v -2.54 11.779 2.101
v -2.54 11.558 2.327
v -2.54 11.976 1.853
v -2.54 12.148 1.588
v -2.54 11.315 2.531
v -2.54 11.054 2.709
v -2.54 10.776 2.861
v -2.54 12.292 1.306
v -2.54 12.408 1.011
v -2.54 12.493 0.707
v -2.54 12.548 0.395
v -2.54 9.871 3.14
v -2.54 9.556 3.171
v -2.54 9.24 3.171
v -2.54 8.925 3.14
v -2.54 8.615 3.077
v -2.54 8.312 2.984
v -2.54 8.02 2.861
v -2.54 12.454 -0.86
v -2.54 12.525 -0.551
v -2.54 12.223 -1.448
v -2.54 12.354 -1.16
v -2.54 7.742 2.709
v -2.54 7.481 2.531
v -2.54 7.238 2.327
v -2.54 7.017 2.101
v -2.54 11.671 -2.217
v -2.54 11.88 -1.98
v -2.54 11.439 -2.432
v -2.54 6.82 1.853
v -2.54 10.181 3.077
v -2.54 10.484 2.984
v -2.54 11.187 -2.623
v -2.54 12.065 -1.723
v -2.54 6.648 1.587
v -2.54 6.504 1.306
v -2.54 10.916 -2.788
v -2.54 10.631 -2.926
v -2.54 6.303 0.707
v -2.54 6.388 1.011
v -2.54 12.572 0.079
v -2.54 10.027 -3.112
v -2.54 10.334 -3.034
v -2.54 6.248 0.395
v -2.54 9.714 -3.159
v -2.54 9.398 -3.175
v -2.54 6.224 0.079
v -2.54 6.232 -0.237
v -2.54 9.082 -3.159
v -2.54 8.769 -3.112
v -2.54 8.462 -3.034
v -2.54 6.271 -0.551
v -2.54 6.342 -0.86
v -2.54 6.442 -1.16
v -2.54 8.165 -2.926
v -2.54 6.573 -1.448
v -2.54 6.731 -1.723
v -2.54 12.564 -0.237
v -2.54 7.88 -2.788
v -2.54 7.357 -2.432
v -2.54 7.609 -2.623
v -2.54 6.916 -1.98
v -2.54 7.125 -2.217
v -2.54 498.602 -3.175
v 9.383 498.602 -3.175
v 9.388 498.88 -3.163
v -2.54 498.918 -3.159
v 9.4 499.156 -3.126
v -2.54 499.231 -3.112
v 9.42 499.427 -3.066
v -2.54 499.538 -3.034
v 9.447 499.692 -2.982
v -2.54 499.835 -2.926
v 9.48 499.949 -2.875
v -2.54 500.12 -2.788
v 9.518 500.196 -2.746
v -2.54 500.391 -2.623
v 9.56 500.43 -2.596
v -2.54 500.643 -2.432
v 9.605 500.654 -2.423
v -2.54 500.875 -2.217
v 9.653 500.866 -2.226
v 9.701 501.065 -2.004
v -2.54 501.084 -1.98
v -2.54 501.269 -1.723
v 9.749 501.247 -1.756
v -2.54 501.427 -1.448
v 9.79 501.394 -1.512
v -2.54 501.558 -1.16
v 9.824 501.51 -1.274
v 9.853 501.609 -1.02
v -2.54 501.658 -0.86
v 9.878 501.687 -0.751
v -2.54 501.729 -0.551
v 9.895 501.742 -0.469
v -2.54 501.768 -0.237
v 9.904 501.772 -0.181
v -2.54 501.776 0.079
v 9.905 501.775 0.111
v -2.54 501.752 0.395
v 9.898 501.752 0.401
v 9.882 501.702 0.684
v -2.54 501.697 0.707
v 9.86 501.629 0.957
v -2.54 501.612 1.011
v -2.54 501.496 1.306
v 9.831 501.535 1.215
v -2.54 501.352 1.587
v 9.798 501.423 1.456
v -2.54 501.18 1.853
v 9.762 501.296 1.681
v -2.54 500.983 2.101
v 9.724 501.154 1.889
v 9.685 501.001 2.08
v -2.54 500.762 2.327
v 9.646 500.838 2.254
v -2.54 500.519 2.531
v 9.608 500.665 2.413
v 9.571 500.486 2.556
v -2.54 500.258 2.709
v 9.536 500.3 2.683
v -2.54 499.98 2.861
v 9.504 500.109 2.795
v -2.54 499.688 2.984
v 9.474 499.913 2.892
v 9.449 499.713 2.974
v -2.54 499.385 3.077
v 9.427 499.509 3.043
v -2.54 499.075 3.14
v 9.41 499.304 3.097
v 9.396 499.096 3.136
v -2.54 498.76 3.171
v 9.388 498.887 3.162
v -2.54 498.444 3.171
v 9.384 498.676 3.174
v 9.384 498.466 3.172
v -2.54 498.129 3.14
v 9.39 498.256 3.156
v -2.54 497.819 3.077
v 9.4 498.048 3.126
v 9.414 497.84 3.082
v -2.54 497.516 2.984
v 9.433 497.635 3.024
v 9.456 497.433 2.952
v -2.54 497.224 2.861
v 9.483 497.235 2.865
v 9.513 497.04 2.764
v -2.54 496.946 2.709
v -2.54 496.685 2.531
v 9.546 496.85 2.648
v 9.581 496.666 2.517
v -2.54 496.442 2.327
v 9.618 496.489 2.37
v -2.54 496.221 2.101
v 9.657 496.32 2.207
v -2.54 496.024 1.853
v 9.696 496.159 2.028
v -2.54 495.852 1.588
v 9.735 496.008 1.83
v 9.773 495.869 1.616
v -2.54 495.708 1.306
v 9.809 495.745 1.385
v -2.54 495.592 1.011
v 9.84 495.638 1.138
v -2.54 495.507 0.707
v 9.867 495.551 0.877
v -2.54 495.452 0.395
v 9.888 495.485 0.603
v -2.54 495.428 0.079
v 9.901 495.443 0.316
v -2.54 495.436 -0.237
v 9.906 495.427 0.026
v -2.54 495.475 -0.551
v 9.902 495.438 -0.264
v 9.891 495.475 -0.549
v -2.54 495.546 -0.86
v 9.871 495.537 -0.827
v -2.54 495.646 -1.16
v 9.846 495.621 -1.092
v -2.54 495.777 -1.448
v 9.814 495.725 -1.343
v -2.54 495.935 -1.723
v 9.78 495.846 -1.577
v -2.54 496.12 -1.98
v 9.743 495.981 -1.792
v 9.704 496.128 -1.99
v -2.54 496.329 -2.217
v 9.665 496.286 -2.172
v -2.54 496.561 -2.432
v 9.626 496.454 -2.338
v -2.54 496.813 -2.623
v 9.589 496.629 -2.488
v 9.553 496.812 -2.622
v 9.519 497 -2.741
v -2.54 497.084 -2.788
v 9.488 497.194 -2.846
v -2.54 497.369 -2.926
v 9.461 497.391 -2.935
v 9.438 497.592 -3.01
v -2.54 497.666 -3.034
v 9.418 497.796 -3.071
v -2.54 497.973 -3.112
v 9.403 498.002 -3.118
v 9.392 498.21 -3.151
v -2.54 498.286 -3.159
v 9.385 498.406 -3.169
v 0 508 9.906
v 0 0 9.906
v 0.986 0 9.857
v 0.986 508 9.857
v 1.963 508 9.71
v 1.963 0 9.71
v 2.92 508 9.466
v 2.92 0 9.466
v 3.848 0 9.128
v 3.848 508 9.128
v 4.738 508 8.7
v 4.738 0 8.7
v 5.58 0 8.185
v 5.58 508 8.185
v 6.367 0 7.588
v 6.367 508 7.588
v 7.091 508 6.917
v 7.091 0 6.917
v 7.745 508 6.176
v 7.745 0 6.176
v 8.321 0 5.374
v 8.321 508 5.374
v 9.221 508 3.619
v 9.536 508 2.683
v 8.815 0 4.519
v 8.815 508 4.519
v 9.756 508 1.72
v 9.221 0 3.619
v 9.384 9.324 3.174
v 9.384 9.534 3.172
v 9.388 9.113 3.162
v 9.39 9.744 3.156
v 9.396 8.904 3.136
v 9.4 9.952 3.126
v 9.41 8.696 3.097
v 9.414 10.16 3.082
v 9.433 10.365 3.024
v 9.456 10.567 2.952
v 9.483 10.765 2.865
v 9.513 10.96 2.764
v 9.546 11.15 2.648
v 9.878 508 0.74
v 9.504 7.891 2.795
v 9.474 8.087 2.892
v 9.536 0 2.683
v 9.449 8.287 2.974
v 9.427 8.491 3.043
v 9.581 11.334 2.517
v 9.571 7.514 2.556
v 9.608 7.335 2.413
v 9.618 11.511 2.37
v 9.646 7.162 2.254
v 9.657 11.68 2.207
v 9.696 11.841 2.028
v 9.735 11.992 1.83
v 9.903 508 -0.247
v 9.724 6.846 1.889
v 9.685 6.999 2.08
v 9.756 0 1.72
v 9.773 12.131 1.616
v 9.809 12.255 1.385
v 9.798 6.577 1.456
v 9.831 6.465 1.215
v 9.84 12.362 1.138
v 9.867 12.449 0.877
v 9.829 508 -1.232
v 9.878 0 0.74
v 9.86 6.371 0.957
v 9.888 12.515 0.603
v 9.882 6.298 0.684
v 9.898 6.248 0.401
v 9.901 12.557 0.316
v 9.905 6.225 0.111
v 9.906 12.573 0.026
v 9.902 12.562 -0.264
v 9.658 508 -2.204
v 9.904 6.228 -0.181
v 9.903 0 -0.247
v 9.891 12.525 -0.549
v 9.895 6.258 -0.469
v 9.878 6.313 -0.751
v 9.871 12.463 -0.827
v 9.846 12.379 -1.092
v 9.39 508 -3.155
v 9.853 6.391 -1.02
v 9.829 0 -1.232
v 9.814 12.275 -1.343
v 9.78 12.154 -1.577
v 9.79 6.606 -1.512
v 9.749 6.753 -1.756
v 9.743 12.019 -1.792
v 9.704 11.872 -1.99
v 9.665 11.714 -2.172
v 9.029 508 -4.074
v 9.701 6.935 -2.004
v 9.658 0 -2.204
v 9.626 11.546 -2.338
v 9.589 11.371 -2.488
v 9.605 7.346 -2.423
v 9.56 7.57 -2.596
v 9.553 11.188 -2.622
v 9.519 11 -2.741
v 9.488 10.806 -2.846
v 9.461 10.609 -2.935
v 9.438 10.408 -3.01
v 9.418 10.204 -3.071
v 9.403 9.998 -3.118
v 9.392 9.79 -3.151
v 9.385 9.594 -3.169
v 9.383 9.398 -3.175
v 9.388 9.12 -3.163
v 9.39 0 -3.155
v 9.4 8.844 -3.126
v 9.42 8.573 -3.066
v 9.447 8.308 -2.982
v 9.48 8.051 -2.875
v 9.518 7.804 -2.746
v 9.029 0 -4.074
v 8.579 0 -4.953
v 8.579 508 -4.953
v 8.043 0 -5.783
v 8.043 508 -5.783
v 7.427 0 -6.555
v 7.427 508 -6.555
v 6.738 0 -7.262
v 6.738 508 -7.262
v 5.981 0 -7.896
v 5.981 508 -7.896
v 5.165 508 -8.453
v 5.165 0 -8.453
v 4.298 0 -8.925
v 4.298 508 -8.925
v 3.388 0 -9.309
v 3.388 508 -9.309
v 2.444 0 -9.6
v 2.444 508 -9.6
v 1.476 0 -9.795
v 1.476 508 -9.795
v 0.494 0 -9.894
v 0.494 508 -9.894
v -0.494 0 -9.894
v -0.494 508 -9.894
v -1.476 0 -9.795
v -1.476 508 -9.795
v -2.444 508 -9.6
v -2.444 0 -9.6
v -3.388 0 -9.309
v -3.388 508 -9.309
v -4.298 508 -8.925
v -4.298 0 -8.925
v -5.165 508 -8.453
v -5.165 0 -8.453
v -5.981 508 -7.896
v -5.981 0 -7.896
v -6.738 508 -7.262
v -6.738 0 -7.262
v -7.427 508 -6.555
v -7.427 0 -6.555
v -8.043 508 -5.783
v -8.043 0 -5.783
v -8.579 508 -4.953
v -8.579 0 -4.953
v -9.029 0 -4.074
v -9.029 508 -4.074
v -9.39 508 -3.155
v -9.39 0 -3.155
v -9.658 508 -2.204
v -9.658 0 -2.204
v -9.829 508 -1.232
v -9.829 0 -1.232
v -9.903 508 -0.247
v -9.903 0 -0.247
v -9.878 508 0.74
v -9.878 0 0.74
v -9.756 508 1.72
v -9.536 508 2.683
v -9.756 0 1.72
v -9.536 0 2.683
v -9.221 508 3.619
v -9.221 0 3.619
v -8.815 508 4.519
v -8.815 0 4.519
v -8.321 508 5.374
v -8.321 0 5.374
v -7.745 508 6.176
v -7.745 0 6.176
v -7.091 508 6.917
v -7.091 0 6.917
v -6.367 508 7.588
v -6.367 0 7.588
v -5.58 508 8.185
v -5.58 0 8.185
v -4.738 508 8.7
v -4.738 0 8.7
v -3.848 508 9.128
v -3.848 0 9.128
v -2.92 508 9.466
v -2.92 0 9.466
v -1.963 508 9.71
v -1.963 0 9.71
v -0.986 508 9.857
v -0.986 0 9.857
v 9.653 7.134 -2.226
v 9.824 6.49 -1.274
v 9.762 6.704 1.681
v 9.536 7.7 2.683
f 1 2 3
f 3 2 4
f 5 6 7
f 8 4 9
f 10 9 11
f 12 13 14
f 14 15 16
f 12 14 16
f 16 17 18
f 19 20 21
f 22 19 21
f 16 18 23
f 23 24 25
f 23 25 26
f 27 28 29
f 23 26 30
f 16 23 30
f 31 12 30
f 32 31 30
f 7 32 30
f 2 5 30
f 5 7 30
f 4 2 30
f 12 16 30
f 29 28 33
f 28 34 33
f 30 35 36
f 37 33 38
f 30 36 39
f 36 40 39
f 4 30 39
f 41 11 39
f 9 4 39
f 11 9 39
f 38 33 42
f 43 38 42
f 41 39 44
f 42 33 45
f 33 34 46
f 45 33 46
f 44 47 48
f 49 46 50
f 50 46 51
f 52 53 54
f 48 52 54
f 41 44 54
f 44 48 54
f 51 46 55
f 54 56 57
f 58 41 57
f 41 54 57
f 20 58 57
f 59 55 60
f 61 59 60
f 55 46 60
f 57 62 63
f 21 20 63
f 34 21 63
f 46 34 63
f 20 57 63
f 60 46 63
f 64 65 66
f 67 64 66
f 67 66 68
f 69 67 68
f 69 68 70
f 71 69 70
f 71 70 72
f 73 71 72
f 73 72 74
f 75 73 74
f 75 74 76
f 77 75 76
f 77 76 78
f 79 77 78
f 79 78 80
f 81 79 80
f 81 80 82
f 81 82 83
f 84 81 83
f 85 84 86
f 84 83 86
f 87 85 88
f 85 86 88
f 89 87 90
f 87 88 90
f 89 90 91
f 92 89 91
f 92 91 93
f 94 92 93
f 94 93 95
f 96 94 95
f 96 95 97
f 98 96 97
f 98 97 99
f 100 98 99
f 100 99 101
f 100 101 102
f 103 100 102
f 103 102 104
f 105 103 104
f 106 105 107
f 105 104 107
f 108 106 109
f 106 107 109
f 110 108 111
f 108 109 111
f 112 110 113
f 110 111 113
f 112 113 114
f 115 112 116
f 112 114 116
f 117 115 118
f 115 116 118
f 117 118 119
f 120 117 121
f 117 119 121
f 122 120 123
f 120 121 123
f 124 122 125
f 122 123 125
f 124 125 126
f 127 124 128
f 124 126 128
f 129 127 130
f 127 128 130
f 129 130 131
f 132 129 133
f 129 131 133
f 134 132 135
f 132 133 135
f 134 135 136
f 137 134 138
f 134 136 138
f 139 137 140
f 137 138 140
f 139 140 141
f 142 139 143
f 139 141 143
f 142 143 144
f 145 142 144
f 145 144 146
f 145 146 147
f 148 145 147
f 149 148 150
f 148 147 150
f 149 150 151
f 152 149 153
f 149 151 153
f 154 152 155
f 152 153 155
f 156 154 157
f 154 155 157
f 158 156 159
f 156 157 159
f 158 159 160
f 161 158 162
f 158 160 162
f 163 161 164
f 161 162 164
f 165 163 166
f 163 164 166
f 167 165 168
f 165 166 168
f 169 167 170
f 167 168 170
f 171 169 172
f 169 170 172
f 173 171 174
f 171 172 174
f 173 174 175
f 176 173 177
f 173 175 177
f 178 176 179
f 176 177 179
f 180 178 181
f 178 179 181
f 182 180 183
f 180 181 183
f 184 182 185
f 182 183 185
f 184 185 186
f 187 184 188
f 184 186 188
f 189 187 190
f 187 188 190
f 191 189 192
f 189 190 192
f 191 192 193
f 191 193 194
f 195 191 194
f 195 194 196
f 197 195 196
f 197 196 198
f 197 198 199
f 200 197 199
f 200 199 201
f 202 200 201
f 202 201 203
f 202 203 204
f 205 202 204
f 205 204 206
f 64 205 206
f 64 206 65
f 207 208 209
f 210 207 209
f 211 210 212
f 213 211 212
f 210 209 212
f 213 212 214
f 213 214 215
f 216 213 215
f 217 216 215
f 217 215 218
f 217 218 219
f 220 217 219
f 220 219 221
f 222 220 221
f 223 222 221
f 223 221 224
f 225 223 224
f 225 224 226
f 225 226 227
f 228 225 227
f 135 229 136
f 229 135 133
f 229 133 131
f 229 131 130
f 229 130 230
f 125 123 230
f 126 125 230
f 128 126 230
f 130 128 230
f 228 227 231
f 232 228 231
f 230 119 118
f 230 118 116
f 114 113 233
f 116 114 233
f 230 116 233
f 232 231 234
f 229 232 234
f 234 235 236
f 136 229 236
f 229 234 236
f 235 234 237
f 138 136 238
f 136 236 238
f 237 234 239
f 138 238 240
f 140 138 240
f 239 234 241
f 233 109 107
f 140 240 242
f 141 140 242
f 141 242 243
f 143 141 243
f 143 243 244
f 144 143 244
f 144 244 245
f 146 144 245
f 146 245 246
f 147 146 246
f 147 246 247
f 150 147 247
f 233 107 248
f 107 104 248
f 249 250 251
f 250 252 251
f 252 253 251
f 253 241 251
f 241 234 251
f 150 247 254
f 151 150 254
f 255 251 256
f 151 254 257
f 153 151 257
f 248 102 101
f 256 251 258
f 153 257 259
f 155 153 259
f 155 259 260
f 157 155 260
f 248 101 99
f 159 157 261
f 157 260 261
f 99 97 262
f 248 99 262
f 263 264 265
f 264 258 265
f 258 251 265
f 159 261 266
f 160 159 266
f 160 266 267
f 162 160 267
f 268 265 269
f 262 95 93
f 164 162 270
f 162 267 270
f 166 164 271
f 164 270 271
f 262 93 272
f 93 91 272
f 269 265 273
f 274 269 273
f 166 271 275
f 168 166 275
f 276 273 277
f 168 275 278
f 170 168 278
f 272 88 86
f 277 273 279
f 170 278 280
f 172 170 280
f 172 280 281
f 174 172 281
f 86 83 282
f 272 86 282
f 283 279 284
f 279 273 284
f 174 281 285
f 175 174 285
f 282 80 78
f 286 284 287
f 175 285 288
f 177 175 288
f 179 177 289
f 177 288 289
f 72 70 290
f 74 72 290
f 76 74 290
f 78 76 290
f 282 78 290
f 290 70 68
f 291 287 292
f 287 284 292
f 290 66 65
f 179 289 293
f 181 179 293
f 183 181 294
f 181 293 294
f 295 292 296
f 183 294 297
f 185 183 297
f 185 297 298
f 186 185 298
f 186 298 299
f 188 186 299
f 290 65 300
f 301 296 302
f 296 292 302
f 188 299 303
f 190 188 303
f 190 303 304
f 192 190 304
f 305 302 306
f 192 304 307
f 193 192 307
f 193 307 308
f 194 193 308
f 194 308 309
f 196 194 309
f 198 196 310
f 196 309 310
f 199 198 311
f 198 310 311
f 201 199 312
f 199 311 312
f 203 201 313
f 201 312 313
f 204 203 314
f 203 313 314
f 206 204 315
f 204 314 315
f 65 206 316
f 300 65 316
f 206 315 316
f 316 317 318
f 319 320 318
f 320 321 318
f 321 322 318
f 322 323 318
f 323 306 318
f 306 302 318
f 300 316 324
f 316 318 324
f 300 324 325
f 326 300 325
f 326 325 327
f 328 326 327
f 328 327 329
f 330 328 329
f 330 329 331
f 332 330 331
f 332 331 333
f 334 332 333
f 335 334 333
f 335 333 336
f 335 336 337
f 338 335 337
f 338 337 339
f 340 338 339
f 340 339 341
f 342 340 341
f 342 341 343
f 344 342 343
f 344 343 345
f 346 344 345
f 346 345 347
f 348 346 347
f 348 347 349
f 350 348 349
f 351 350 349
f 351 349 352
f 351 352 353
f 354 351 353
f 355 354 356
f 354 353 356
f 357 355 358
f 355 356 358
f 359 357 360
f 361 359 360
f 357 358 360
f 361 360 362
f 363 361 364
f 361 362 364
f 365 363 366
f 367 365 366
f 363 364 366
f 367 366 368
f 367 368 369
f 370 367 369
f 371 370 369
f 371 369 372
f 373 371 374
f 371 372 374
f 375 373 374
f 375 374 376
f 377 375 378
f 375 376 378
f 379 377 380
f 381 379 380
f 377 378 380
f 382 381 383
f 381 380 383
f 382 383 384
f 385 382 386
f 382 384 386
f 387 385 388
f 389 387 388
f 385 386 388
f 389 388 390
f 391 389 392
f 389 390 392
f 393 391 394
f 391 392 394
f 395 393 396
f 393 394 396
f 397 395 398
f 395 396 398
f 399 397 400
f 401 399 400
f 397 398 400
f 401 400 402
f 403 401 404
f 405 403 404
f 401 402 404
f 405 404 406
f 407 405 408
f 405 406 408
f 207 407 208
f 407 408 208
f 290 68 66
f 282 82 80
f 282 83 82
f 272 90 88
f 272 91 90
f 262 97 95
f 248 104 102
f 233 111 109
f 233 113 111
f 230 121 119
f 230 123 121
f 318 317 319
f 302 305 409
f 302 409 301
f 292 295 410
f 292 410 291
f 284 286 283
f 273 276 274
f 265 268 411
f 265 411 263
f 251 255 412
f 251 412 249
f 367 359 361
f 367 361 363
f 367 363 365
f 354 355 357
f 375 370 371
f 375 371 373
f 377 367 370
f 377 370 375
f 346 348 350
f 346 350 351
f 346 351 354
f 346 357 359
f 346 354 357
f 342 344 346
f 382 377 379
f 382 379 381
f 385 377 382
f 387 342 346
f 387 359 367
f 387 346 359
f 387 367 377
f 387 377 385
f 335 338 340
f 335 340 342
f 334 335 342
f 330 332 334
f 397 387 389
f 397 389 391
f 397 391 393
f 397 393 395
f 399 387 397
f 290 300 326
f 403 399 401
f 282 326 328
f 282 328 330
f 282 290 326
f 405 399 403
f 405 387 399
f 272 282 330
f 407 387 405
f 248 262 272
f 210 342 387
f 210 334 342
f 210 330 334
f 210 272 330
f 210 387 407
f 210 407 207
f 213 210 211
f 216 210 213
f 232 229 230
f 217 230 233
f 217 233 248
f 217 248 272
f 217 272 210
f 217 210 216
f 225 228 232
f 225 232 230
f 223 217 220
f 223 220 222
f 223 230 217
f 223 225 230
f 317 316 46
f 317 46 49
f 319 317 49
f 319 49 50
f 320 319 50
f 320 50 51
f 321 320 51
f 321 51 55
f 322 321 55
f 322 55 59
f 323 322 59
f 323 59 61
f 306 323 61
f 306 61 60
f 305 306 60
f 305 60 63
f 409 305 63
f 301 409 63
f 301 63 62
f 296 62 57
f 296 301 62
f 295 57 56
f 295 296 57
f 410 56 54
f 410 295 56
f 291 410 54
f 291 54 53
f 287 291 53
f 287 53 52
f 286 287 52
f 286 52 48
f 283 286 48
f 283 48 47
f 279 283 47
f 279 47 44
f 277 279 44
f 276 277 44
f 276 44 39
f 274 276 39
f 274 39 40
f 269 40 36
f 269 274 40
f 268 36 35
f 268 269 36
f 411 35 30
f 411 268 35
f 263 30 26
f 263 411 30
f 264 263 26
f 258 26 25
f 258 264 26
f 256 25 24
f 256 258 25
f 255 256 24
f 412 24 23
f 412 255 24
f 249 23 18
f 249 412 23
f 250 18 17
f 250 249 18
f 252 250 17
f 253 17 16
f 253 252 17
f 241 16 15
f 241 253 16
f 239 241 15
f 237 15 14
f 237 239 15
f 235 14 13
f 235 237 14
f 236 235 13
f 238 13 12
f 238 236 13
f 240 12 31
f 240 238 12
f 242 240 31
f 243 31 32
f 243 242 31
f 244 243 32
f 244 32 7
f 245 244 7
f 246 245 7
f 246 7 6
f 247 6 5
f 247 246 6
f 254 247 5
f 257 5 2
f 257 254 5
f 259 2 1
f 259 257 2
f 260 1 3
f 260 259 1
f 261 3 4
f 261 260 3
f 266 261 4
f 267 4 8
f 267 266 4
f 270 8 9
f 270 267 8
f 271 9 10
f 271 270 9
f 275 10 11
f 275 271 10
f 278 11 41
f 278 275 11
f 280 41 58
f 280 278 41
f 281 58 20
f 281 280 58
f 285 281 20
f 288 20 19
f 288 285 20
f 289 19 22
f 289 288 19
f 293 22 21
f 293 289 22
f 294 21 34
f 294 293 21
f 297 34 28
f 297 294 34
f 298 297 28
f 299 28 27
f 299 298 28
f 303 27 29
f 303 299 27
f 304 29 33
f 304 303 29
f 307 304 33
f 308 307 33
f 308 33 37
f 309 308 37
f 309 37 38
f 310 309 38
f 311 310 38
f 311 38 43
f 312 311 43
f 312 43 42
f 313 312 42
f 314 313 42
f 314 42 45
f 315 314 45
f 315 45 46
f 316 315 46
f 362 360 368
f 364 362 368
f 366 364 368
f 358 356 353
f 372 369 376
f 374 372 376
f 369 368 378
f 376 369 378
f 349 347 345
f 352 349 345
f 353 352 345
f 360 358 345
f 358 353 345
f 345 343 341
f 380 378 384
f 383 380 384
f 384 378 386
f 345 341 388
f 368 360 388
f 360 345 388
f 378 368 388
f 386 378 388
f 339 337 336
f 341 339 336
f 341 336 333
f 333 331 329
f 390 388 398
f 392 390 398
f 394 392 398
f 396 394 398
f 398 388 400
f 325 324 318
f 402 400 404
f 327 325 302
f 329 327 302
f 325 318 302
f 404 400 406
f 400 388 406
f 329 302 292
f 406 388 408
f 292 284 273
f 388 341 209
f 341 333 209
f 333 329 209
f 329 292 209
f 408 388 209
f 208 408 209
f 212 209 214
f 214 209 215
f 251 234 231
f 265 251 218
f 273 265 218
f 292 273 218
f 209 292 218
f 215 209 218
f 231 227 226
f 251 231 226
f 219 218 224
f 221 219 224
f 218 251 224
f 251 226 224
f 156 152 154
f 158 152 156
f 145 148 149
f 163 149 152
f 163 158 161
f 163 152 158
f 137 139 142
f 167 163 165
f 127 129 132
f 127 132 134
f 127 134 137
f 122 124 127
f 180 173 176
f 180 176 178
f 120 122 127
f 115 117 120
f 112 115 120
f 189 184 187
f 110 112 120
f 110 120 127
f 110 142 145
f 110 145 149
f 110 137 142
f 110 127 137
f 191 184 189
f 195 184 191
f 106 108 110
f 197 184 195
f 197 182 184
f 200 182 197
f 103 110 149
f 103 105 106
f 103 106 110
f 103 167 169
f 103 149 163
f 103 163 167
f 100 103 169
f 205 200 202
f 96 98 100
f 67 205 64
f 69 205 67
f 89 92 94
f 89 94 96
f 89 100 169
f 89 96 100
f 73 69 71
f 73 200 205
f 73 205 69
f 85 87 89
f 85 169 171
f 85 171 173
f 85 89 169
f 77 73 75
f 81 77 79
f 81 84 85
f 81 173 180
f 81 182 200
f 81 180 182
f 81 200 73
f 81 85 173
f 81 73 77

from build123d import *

# Parameters (mm, degrees)
SKETCH1_R           = 9.906
BOSS_EXTRUDE1_DEPTH = 508
CUT_EXTRUDE1_START  = 20.32
SKETCH2_R           = 3.175
CUT_EXTRUDE1_DEPTH  = 22.86


with BuildPart() as part:
    # Sketch1 → Boss-Extrude1 (new body)
    with BuildSketch(Plane(origin=(0, 0, 0), x_dir=(1, 0, 0), z_dir=(0, 1, 0))):
        with Locations(Location((0, 0, 0), (0, 0, 270))):
            Circle(SKETCH1_R)
    extrude(amount=BOSS_EXTRUDE1_DEPTH)

    # Sketch2 → Cut-Extrude1 (cut)
    with BuildSketch(Plane(origin=(0, 0, 0), x_dir=(0, 0, -1), z_dir=(1, 0, 0)).offset(CUT_EXTRUDE1_START)):
        with Locations((0, 498.602)):
            Circle(SKETCH2_R)
    cut_extrude1 = extrude(amount=-CUT_EXTRUDE1_DEPTH, mode=Mode.SUBTRACT)

    # Mirror1: Cut-Extrude1 across plane
    add(cut_extrude1.mirror(Plane.ZX.offset(254)), mode=Mode.SUBTRACT)


solid = part.part
